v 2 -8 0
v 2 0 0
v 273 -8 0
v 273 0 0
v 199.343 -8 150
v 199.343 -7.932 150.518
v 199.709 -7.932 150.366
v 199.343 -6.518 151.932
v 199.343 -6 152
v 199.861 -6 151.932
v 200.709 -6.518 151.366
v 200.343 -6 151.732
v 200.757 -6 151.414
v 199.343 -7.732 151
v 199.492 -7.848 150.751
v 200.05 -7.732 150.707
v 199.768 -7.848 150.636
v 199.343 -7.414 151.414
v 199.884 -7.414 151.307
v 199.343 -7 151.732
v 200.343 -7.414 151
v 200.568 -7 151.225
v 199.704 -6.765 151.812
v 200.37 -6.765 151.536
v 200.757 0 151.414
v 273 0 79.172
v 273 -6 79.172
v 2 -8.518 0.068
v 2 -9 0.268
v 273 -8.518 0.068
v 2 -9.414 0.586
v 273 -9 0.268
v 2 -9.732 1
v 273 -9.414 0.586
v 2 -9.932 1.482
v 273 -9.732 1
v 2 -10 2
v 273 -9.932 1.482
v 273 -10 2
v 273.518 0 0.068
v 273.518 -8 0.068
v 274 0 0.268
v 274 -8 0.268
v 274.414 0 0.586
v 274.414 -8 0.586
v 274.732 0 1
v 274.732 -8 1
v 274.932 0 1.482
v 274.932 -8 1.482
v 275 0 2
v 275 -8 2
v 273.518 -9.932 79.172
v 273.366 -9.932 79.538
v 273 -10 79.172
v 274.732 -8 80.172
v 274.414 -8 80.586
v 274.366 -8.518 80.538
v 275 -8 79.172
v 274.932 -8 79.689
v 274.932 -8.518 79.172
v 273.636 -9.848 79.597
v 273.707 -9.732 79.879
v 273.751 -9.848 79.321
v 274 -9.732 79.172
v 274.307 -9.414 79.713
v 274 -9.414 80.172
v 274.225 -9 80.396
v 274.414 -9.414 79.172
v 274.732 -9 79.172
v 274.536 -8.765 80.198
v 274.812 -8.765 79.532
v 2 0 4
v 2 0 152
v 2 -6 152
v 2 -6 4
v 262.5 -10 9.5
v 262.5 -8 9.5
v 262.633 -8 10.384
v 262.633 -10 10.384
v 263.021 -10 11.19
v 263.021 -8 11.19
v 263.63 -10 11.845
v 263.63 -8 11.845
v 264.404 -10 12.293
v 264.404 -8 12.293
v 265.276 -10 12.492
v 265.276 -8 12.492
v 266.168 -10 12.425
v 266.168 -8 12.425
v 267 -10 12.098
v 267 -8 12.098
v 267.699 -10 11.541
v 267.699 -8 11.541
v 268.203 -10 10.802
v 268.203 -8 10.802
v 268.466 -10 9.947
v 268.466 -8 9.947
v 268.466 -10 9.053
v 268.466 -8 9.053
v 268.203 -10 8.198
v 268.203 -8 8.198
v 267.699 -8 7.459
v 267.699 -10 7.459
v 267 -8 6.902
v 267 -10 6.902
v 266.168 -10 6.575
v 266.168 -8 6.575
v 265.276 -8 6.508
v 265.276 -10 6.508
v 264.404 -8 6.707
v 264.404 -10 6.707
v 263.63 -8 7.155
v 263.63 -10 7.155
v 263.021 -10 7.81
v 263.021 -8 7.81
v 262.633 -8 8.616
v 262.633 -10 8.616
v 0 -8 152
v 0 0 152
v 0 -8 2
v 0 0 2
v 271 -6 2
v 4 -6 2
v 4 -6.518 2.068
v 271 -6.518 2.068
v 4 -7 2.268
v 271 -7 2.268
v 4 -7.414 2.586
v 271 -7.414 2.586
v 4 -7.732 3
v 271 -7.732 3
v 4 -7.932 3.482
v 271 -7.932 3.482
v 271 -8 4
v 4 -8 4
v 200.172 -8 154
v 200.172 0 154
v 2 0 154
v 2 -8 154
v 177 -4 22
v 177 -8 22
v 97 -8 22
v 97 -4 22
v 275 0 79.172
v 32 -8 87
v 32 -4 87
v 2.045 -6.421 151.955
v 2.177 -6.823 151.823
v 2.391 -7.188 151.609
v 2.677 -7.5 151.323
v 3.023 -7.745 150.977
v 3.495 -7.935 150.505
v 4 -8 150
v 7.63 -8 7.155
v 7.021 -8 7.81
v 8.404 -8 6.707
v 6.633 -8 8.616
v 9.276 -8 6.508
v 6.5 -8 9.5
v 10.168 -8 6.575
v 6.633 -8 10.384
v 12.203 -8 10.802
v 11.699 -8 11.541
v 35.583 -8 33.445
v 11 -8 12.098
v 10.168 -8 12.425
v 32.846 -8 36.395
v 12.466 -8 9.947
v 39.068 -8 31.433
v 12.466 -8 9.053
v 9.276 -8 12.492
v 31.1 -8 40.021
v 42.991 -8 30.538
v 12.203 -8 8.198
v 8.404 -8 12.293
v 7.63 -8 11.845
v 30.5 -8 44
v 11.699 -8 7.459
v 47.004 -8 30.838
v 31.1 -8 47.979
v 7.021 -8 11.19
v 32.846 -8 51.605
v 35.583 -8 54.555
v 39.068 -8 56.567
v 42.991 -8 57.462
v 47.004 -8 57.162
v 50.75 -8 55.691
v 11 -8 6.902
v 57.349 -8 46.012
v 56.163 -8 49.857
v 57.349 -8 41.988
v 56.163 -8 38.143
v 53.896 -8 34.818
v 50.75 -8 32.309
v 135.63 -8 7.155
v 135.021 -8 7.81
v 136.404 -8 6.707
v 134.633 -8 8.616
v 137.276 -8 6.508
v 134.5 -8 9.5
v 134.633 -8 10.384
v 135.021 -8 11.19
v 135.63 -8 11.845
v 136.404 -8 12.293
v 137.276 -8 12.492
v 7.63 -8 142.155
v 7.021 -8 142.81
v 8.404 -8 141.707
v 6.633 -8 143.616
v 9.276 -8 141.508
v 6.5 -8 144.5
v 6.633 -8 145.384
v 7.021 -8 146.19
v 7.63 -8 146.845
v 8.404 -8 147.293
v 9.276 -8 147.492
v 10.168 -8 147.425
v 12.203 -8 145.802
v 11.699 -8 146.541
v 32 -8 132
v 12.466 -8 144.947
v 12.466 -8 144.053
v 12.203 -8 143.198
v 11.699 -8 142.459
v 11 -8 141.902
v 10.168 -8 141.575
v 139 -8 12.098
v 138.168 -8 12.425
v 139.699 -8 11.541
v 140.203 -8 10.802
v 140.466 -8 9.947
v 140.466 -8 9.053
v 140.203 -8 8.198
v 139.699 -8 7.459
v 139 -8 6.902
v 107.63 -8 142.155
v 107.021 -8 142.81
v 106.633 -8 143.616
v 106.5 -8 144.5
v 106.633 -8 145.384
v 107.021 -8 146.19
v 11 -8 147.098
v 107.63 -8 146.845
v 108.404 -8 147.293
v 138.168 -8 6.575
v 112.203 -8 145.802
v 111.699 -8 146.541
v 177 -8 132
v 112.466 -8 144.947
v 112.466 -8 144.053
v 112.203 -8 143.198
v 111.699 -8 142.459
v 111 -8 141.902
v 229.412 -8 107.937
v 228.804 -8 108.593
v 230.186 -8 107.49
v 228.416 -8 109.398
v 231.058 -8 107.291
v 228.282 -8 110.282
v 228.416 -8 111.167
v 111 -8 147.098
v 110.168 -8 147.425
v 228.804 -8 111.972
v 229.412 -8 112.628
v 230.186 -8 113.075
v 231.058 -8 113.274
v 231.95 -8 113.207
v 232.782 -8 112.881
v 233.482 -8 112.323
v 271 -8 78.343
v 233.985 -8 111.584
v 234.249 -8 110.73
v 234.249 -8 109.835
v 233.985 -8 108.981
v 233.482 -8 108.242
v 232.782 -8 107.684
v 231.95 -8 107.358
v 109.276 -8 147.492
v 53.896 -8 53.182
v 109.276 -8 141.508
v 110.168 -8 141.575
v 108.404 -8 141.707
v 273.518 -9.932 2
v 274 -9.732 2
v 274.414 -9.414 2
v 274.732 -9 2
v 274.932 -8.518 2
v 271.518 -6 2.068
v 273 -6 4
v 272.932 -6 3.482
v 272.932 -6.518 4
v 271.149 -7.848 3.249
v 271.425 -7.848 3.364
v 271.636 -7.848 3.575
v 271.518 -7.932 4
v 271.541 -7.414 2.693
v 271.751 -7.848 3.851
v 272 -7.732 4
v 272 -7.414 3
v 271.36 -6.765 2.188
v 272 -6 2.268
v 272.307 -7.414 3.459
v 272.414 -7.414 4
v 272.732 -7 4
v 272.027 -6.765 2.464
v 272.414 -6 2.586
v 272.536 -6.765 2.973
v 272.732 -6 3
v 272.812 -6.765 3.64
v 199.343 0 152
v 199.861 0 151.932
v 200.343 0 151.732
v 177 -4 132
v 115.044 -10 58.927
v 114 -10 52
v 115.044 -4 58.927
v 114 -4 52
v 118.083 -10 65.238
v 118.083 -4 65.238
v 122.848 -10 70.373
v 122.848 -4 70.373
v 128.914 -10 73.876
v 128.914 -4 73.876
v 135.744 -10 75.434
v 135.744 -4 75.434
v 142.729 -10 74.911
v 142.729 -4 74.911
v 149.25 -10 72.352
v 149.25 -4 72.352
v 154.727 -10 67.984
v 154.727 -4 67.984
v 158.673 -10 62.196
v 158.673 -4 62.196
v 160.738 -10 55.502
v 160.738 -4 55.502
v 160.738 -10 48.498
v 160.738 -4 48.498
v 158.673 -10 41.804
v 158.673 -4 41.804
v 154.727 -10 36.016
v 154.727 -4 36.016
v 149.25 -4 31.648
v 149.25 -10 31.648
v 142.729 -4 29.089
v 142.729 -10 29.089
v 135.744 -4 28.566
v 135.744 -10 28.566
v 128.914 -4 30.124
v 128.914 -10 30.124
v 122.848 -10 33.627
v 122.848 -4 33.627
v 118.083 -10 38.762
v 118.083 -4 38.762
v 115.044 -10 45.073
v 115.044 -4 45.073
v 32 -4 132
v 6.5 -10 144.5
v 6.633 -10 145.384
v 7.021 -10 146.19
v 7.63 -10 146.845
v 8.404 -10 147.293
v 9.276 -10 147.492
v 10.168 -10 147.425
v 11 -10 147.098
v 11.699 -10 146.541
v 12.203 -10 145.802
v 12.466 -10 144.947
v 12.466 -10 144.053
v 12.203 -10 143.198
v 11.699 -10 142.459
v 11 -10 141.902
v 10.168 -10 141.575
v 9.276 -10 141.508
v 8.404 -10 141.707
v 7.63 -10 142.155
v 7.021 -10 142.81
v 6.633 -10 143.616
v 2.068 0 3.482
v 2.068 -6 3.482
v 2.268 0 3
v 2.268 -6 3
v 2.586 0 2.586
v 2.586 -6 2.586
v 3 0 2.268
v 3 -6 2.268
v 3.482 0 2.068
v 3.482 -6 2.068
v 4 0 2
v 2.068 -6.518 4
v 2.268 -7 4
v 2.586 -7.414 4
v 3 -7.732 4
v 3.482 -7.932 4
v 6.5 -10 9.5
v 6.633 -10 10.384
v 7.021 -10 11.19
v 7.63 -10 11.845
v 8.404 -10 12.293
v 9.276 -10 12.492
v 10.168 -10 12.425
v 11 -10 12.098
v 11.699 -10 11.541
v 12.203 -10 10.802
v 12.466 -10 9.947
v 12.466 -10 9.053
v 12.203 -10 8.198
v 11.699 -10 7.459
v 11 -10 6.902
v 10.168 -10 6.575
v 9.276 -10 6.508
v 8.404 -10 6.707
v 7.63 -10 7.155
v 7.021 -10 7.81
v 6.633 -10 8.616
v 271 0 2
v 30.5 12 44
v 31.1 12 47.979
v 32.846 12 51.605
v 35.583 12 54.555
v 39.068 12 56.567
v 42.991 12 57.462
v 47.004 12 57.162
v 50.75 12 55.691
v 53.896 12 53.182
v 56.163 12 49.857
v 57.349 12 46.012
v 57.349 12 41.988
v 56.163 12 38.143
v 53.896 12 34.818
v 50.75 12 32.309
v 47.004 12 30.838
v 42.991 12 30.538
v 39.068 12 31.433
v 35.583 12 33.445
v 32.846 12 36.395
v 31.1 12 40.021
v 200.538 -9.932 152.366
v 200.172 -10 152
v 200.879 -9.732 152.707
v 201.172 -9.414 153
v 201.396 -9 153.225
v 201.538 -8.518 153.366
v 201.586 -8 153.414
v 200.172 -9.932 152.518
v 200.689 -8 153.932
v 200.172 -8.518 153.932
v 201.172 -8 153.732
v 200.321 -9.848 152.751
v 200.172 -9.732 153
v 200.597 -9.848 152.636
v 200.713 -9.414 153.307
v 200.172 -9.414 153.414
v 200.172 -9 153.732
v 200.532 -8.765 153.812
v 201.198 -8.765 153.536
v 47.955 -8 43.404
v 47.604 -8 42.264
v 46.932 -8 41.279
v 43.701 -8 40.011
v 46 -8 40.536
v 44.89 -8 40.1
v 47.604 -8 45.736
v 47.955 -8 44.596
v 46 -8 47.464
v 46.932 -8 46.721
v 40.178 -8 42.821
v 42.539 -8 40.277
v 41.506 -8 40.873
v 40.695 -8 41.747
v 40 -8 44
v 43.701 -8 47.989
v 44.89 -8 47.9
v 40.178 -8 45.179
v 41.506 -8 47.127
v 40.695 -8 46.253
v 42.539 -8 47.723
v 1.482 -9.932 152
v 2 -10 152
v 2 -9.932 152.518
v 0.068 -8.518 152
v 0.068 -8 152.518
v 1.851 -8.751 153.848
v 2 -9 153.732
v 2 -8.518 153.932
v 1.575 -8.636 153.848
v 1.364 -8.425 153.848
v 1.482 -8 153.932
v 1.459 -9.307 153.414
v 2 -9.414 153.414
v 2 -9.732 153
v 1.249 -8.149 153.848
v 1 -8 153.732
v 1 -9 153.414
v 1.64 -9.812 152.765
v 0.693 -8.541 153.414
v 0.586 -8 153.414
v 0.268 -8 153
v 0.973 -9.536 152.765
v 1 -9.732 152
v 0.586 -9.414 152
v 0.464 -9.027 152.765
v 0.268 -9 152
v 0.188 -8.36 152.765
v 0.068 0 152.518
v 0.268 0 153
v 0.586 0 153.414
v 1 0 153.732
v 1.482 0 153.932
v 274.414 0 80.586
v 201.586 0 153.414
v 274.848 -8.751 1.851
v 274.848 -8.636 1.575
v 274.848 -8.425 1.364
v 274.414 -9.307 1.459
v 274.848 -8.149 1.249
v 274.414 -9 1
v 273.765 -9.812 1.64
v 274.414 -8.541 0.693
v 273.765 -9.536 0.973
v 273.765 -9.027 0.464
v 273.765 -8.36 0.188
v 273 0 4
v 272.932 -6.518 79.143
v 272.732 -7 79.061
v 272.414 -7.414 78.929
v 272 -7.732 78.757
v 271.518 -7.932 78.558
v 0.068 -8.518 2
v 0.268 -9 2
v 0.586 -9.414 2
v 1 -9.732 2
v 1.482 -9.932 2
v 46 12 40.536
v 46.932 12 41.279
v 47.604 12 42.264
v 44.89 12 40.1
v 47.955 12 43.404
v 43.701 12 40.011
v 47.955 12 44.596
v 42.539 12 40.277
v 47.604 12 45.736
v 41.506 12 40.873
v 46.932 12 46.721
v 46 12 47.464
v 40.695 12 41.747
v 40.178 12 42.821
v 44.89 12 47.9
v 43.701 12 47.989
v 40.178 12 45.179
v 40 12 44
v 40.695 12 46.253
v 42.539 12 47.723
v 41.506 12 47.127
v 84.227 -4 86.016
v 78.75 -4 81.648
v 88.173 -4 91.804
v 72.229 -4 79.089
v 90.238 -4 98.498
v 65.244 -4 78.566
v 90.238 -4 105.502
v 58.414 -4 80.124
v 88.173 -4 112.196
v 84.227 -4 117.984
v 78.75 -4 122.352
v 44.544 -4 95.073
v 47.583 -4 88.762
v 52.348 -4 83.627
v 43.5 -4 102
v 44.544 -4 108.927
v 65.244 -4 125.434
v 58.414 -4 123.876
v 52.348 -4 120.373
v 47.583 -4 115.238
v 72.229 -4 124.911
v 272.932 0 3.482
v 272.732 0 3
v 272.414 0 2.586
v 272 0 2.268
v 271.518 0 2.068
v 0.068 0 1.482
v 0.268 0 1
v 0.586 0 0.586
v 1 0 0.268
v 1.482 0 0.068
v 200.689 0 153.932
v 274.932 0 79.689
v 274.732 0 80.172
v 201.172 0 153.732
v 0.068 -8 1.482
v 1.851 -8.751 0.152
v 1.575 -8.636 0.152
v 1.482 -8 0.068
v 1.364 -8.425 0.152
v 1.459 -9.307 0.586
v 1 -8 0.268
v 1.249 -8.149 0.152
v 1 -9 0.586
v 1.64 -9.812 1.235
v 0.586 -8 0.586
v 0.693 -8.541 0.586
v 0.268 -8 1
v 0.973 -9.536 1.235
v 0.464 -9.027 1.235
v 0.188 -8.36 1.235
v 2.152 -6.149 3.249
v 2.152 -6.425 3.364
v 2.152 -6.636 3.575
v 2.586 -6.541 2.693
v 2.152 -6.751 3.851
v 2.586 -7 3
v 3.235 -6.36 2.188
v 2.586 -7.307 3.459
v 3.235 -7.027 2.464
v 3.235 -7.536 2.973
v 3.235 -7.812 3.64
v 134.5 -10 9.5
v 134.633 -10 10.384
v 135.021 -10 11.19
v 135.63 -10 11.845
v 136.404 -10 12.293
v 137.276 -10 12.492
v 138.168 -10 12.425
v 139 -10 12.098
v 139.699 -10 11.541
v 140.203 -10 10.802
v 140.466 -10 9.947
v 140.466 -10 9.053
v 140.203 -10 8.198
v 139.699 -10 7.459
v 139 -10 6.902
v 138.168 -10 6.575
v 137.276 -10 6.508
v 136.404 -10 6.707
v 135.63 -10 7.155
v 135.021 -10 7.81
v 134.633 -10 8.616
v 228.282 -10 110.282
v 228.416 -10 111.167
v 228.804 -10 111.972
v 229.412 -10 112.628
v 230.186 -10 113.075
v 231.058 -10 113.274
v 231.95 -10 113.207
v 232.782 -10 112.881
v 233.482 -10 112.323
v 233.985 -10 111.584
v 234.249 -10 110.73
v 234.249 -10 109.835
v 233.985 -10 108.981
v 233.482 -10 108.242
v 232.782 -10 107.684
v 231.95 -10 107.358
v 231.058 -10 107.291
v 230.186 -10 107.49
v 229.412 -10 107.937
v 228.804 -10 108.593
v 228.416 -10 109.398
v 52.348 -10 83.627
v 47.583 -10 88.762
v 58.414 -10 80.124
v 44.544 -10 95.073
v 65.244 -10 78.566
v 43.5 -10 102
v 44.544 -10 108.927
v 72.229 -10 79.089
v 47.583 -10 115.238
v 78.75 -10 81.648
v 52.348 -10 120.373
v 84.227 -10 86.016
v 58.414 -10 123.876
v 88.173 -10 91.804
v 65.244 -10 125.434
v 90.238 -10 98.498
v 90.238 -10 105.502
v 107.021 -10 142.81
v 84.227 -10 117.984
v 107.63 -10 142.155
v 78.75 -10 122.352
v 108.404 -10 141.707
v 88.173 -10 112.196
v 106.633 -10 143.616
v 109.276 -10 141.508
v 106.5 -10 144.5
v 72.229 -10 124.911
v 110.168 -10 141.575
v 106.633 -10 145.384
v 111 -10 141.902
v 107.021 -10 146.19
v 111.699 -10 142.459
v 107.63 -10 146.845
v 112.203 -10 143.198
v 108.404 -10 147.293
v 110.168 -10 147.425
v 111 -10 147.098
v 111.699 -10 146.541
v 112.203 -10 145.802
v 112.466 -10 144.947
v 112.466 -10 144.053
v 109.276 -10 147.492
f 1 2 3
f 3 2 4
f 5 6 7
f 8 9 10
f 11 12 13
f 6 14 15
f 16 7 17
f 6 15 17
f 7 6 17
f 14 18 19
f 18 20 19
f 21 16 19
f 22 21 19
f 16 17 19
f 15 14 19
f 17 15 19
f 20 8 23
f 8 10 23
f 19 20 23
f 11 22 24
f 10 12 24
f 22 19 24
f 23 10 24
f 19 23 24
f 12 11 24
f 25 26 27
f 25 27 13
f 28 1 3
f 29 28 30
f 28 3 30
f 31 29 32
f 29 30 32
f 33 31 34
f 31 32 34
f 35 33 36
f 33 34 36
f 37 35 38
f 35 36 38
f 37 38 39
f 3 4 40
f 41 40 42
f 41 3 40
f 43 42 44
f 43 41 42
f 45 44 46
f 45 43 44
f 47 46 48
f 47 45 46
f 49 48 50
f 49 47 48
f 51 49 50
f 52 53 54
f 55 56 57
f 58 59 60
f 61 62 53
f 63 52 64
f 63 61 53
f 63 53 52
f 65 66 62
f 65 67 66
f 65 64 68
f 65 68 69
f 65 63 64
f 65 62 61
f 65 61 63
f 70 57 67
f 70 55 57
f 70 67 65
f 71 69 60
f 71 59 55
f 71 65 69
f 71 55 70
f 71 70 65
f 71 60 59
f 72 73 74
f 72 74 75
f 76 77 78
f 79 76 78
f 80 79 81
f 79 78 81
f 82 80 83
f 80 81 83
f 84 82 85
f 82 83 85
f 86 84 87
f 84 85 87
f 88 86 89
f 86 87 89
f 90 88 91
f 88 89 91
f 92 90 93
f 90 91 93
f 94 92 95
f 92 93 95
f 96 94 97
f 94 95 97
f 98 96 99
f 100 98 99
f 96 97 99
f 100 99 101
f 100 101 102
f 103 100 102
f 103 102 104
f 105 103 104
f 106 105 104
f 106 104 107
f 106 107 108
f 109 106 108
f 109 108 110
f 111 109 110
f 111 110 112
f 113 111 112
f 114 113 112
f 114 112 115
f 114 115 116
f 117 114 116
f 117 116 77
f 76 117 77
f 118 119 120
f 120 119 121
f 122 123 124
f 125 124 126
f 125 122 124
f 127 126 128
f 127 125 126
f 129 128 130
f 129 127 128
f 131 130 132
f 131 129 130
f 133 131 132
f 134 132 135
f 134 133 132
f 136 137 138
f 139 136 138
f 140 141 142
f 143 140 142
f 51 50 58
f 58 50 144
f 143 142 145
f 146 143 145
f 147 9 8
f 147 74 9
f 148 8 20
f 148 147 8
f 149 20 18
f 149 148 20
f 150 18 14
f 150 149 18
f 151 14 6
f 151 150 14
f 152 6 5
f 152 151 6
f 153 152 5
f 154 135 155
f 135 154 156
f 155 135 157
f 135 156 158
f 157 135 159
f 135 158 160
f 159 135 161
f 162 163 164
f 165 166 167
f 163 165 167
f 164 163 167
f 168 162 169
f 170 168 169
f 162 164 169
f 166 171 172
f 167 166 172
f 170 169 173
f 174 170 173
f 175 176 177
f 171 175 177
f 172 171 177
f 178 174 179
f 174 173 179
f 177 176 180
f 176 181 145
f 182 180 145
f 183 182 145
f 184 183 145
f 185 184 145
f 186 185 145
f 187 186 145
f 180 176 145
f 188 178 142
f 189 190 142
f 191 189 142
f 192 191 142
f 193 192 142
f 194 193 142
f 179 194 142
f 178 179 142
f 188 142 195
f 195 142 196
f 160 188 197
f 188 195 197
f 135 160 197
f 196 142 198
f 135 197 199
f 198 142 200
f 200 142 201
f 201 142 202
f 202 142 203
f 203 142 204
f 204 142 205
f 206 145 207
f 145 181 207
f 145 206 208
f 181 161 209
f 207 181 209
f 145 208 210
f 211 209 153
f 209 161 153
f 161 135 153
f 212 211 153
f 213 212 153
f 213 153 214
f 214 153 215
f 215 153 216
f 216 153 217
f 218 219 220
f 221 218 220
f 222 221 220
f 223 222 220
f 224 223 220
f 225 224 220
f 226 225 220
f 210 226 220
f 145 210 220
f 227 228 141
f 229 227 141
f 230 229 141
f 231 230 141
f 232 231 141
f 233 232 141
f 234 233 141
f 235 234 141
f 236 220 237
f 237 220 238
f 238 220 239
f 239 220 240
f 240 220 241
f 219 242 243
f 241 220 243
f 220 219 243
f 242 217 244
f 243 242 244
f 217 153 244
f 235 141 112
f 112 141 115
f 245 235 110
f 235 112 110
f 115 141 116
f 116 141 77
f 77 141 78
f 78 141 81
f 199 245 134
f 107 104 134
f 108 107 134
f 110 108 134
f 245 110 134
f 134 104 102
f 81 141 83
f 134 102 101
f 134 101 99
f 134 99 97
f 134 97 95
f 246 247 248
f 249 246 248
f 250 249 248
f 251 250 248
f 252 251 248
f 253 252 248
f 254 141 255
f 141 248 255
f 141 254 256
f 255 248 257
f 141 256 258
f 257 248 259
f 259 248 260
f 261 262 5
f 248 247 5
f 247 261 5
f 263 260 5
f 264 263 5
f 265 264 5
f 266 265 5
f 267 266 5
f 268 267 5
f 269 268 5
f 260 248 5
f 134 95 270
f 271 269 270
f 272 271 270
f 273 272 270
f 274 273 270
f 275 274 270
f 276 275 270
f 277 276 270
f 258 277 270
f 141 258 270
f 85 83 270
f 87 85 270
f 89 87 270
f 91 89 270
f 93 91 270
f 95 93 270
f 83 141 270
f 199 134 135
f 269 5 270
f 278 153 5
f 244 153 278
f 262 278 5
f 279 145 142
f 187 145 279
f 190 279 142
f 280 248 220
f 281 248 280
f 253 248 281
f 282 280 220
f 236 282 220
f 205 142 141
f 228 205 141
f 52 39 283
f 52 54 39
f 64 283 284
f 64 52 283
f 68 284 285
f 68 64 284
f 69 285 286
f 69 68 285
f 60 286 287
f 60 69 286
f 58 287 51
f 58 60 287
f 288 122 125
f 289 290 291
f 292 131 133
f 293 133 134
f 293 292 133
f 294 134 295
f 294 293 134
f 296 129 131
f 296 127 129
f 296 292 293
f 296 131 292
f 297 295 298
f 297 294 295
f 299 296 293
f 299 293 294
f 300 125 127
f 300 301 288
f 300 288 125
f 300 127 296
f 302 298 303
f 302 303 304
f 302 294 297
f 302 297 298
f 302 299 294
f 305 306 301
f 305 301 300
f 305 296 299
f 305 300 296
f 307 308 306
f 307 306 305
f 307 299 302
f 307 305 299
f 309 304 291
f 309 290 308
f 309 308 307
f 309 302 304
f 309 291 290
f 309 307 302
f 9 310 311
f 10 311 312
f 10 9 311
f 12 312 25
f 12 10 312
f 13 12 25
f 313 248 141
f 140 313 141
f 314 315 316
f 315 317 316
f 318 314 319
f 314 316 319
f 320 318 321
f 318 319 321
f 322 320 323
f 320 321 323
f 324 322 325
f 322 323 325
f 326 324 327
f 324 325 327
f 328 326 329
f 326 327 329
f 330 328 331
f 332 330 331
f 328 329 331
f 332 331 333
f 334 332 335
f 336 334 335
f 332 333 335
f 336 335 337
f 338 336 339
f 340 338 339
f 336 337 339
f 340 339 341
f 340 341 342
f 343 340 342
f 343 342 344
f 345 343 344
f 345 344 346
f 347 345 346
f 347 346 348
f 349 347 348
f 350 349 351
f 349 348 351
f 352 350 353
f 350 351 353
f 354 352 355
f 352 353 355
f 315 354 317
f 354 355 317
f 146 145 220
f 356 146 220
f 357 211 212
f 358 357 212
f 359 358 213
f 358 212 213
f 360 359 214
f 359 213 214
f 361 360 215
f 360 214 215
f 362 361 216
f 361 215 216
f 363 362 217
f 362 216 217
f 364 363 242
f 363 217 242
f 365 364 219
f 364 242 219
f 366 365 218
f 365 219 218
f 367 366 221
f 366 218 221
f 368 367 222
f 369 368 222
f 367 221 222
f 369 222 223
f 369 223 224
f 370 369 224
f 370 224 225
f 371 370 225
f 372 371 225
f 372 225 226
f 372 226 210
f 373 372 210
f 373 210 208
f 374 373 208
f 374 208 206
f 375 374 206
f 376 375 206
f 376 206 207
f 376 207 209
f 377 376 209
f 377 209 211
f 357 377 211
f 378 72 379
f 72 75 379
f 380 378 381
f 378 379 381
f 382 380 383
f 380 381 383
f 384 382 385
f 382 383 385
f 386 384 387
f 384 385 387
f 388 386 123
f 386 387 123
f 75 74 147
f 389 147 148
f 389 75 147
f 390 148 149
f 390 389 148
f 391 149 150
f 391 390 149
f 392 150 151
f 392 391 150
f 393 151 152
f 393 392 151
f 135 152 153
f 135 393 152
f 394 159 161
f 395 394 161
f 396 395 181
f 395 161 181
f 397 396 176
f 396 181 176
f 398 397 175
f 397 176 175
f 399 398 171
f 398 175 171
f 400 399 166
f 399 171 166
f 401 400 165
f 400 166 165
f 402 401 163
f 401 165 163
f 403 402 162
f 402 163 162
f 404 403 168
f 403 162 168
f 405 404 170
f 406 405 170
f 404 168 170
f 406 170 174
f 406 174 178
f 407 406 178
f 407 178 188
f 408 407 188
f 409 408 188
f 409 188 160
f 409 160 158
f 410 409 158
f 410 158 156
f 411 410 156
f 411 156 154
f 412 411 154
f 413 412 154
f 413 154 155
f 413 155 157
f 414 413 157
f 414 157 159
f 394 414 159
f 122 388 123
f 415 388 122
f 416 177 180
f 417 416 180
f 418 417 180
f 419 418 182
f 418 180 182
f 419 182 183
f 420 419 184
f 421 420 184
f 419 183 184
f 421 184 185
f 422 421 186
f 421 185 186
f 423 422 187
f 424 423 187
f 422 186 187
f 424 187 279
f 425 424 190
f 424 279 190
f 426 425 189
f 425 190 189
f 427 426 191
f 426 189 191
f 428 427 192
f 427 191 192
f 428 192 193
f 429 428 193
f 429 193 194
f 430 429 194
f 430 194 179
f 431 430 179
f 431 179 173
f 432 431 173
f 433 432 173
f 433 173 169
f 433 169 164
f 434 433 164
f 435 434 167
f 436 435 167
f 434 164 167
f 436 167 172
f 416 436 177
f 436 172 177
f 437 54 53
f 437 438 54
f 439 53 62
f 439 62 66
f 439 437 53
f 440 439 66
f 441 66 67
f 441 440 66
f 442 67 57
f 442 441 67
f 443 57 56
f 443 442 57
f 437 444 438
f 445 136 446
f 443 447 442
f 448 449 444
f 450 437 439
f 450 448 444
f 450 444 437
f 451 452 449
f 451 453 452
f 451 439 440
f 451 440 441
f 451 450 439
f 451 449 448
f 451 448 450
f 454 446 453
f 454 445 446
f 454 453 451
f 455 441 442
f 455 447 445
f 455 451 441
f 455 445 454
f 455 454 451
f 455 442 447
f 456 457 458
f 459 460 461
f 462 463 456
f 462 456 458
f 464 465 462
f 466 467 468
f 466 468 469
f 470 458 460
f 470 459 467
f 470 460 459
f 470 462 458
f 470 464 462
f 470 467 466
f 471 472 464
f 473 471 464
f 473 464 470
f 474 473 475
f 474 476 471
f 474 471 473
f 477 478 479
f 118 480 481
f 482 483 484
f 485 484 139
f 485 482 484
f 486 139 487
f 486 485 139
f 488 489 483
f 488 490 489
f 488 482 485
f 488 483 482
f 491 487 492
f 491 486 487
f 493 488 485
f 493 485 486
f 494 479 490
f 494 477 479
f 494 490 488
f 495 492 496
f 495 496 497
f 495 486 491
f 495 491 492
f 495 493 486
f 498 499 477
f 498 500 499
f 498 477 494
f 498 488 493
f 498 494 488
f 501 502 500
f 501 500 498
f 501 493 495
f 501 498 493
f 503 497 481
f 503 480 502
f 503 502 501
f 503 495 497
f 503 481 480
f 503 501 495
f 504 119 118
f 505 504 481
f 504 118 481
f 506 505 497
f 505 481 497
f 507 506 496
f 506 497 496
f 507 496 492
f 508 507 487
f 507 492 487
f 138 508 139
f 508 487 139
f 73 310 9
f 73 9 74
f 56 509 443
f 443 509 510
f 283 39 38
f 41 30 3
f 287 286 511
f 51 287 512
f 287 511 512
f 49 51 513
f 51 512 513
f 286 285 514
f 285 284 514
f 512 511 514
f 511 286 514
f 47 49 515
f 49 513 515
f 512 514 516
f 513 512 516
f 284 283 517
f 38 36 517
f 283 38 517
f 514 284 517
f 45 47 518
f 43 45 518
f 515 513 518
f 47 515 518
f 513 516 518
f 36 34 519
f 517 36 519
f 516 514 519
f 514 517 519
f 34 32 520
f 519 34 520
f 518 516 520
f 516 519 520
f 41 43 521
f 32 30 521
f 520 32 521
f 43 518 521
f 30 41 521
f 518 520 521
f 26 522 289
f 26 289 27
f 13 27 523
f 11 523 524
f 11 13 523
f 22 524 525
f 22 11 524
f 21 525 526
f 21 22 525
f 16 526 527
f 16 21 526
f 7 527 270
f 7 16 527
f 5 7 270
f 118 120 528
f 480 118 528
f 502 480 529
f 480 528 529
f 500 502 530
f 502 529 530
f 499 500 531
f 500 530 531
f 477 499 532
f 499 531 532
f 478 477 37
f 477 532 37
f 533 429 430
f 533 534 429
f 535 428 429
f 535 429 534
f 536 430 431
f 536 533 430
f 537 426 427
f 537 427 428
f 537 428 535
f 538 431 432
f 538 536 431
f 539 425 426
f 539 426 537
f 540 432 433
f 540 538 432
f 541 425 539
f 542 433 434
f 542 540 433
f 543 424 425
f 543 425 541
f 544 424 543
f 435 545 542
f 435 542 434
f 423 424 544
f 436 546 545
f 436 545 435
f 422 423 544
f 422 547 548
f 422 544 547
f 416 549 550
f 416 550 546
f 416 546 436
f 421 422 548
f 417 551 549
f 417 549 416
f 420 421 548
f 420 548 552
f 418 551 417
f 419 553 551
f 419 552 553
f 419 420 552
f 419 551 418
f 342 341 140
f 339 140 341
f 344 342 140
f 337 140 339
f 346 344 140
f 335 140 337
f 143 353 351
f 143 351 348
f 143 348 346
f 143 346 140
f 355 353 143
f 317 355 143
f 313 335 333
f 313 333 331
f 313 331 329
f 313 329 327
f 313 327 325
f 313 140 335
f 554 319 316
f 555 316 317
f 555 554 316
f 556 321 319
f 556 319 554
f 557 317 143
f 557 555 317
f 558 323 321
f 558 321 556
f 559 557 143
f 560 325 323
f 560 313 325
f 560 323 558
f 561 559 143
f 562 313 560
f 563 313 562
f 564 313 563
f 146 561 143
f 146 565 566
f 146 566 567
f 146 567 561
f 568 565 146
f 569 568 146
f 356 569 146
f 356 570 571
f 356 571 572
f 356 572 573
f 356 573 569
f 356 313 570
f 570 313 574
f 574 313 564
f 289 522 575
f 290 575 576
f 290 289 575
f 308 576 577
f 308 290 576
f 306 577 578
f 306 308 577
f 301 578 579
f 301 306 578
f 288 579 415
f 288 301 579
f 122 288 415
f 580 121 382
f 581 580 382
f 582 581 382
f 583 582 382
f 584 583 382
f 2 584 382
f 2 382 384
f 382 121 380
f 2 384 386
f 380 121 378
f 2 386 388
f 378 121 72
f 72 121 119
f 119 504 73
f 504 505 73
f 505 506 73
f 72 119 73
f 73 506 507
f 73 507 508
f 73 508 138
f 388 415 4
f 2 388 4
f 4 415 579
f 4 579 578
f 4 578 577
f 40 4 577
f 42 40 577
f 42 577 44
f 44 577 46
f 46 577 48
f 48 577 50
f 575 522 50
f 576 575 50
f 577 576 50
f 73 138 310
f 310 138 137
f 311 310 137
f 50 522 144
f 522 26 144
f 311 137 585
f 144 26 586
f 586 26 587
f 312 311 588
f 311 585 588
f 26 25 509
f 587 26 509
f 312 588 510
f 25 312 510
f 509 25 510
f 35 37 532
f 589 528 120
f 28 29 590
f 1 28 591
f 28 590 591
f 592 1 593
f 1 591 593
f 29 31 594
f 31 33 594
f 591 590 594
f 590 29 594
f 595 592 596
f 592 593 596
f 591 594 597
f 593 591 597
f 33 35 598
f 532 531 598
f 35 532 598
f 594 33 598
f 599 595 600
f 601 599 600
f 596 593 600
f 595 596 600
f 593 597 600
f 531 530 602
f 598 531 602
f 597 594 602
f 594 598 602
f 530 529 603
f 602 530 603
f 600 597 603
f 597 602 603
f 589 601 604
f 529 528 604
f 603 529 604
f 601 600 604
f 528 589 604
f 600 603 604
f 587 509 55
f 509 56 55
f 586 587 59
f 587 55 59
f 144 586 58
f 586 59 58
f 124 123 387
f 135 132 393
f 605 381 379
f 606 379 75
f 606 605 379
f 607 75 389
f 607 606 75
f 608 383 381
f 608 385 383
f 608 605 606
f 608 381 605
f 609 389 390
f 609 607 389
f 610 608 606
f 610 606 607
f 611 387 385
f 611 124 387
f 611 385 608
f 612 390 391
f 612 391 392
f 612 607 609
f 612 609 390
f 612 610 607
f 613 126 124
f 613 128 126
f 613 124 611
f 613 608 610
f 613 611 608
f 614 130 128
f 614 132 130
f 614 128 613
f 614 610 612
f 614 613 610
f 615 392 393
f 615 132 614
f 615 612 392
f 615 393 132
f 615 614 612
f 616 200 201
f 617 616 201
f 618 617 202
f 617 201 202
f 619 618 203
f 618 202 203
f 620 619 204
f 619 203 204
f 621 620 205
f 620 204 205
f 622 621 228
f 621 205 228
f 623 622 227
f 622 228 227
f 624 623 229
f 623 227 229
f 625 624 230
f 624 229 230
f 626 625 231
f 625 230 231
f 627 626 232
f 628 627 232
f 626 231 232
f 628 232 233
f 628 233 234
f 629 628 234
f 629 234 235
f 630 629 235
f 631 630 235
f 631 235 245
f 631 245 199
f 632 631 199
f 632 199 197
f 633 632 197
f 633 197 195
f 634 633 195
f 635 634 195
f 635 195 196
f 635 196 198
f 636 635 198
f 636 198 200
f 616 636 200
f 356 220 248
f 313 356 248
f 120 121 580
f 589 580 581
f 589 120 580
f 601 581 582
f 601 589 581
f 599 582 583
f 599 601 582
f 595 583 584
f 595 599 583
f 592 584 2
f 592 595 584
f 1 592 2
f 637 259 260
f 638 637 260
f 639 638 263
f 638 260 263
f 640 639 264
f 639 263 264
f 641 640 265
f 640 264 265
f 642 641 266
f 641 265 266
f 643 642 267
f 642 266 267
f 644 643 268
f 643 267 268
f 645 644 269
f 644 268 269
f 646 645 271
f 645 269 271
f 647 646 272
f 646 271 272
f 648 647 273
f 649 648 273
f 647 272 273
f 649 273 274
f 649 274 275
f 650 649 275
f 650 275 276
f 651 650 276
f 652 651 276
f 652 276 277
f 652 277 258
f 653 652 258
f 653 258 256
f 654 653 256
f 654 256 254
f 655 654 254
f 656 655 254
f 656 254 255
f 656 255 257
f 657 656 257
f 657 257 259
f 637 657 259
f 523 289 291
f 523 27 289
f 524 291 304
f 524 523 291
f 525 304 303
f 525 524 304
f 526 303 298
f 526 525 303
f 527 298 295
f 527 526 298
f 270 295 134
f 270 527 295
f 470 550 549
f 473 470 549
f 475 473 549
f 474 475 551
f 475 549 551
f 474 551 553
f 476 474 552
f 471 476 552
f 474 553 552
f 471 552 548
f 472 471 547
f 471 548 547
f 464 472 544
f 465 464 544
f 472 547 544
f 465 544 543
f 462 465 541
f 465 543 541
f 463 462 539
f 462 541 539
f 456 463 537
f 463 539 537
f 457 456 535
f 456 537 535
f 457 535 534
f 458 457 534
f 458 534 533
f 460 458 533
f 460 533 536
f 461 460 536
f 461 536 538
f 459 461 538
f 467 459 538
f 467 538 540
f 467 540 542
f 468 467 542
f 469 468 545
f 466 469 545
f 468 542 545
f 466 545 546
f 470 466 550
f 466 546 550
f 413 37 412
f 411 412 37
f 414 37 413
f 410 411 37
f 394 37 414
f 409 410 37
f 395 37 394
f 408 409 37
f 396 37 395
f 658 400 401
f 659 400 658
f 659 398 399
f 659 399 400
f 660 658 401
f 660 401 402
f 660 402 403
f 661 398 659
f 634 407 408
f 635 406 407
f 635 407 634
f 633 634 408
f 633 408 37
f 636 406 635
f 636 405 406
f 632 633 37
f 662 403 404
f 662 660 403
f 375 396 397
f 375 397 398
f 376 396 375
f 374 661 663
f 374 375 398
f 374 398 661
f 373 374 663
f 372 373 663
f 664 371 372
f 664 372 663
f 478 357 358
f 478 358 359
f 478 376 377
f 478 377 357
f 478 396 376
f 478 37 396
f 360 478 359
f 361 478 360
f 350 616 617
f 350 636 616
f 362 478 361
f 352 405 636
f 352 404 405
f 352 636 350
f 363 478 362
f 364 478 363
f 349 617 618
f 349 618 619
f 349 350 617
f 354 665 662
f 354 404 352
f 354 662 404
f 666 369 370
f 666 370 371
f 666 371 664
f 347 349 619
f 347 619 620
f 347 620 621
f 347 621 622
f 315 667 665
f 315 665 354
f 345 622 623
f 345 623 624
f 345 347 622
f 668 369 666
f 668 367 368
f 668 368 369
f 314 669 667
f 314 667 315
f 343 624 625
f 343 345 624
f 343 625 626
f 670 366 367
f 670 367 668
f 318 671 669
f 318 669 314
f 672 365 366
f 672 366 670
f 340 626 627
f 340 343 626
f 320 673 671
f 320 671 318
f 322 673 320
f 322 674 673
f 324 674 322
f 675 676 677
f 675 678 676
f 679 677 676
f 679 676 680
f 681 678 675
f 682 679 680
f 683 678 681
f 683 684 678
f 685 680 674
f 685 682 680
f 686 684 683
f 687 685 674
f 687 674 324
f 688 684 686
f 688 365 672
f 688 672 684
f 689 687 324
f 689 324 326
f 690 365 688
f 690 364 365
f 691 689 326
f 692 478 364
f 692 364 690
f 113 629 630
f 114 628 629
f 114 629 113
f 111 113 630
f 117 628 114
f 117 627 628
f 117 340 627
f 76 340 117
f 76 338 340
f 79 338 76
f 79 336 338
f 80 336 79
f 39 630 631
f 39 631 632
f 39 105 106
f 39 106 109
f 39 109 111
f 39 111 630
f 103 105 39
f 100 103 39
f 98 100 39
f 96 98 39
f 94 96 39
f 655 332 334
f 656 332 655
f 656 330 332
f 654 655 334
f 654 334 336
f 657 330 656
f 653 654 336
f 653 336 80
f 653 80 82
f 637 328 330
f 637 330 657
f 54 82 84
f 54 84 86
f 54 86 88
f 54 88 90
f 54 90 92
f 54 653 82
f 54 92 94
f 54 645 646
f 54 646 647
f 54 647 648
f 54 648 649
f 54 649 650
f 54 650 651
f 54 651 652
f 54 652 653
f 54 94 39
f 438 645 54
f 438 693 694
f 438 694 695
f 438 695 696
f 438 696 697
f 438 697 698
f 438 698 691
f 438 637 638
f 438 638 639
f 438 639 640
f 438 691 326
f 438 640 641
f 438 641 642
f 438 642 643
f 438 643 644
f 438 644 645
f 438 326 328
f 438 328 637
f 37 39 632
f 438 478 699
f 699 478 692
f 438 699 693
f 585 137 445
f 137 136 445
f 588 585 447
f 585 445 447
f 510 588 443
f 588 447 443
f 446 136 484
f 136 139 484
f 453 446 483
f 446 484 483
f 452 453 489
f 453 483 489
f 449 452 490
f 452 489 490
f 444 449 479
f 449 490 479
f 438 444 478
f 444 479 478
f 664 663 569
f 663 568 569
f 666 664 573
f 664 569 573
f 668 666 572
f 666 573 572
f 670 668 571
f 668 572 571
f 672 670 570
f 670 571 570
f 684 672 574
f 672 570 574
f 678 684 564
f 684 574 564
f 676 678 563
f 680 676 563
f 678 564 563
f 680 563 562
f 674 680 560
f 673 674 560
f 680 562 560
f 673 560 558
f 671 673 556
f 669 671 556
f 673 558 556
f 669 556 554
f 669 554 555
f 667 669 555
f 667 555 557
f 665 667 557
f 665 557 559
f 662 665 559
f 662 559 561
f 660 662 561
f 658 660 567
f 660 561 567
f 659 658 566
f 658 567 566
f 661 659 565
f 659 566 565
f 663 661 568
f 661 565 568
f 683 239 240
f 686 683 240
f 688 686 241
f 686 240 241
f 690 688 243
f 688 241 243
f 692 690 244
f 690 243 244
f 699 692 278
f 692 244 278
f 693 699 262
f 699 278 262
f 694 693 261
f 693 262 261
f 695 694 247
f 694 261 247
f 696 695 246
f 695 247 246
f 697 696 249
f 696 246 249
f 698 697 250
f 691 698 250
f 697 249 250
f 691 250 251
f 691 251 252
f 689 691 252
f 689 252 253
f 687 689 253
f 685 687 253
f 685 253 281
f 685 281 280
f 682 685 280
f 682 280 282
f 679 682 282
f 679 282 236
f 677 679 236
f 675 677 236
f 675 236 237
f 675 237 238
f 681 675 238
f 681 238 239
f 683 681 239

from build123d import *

# Parameters (mm, degrees)
F1_DEPTH      = 10
F2_T          = -2
F5_DEPTH      = 4
F3_R          = 23.5
F6_DEPTH      = 8.001
F6_DEPTH_BACK = 2.001
F7_R          = 13.5
F8_DEPTH      = 20
F9_R          = 4
F10_DEPTH     = 20
F12_D         = 6
F13_R         = 2
F14_R         = 2


with BuildPart() as f1:
    # F0 (on Front) → F1 (new body)
    with BuildSketch(Plane.XZ):
        Polygon((0, 154), (0, 0), (275, 0), (275, 80), (201, 154), align=None)
    extrude(amount=F1_DEPTH)

    # F2
    f2_openings = [f1.faces().sort_by_distance(p)[0] for p in [
        (129.700907, 0, 73.382695),
    ]]
    offset(amount=F2_T, openings=f2_openings)

    # F4 (on face) → F5 (join)
    with BuildSketch(Plane(origin=(0, -8, 0), x_dir=(-1, 0, 0), z_dir=(0, 1, 0))):
        Polygon((-32, 87), (-32, 132), (-177, 132), (-177, 22), (-97, 22), align=None)
    extrude(amount=F5_DEPTH)

    # F3 (on face) → F6 (cut, two sides)
    with BuildSketch(Plane(origin=(0, -8, 0), x_dir=(-1, 0, 0), z_dir=(0, 1, 0))) as f6_sk:
        with Locations((-67, 102)):
            Circle(F3_R)
        with Locations((-137.5, 52)):
            Circle(F3_R)
    extrude(amount=F6_DEPTH, mode=Mode.SUBTRACT)
    extrude(f6_sk.sketch, amount=-F6_DEPTH_BACK, mode=Mode.SUBTRACT)

    # F7 (on face) → F8 (join)
    with BuildSketch(Plane(origin=(0, -8, 0), x_dir=(-1, 0, 0), z_dir=(0, 1, 0))):
        with Locations((-44, 44)):
            Circle(F7_R)
    extrude(amount=F8_DEPTH)

    # F9 (on face) → F10 (cut, through all)
    with BuildSketch(Plane(origin=(0, 12, 0), x_dir=(-1, 0, 0), z_dir=(0, 1, 0))):
        with Locations((-44, 44)):
            Circle(F9_R)
    extrude(amount=-F10_DEPTH, mode=Mode.SUBTRACT)

    # F12 (through all)
    with Locations(Plane.XZ.offset(10)):
        with Locations((9.5, 144.5), (109.5, 144.5), (231.2824855787, 110.2824855787), (265.5, 9.5), (137.5, 9.5), (9.5, 9.5)):
            Hole(F12_D / 2)

    # F13
    f13_edges = [f1.edges().sort_by_distance(p)[0] for p in [
        (0, -10, 77),
        (137.5, -10, 0),
        (238, -10, 117),
        (275, -10, 40),
        (275, -5, 0),
        (275, -5, 80),
        (201, -5, 154),
        (0, -5, 0),
        (100.5, -10, 154),
        (0, -5, 154),
    ]]
    fillet(f13_edges, radius=F13_R)

    # F14
    f14_edges = [f1.edges().sort_by_distance(p)[0] for p in [
        (273, -4, 2),
        (137.5, -8, 2),
        (273, -8, 40.585786),
        (236.585786, -8, 115.585786),
        (200.171573, -4, 152),
        (101.085786, -8, 152),
        (2, -4, 2),
        (2, -8, 77),
    ]]
    fillet(f14_edges, radius=F14_R)


solid = f1.part
